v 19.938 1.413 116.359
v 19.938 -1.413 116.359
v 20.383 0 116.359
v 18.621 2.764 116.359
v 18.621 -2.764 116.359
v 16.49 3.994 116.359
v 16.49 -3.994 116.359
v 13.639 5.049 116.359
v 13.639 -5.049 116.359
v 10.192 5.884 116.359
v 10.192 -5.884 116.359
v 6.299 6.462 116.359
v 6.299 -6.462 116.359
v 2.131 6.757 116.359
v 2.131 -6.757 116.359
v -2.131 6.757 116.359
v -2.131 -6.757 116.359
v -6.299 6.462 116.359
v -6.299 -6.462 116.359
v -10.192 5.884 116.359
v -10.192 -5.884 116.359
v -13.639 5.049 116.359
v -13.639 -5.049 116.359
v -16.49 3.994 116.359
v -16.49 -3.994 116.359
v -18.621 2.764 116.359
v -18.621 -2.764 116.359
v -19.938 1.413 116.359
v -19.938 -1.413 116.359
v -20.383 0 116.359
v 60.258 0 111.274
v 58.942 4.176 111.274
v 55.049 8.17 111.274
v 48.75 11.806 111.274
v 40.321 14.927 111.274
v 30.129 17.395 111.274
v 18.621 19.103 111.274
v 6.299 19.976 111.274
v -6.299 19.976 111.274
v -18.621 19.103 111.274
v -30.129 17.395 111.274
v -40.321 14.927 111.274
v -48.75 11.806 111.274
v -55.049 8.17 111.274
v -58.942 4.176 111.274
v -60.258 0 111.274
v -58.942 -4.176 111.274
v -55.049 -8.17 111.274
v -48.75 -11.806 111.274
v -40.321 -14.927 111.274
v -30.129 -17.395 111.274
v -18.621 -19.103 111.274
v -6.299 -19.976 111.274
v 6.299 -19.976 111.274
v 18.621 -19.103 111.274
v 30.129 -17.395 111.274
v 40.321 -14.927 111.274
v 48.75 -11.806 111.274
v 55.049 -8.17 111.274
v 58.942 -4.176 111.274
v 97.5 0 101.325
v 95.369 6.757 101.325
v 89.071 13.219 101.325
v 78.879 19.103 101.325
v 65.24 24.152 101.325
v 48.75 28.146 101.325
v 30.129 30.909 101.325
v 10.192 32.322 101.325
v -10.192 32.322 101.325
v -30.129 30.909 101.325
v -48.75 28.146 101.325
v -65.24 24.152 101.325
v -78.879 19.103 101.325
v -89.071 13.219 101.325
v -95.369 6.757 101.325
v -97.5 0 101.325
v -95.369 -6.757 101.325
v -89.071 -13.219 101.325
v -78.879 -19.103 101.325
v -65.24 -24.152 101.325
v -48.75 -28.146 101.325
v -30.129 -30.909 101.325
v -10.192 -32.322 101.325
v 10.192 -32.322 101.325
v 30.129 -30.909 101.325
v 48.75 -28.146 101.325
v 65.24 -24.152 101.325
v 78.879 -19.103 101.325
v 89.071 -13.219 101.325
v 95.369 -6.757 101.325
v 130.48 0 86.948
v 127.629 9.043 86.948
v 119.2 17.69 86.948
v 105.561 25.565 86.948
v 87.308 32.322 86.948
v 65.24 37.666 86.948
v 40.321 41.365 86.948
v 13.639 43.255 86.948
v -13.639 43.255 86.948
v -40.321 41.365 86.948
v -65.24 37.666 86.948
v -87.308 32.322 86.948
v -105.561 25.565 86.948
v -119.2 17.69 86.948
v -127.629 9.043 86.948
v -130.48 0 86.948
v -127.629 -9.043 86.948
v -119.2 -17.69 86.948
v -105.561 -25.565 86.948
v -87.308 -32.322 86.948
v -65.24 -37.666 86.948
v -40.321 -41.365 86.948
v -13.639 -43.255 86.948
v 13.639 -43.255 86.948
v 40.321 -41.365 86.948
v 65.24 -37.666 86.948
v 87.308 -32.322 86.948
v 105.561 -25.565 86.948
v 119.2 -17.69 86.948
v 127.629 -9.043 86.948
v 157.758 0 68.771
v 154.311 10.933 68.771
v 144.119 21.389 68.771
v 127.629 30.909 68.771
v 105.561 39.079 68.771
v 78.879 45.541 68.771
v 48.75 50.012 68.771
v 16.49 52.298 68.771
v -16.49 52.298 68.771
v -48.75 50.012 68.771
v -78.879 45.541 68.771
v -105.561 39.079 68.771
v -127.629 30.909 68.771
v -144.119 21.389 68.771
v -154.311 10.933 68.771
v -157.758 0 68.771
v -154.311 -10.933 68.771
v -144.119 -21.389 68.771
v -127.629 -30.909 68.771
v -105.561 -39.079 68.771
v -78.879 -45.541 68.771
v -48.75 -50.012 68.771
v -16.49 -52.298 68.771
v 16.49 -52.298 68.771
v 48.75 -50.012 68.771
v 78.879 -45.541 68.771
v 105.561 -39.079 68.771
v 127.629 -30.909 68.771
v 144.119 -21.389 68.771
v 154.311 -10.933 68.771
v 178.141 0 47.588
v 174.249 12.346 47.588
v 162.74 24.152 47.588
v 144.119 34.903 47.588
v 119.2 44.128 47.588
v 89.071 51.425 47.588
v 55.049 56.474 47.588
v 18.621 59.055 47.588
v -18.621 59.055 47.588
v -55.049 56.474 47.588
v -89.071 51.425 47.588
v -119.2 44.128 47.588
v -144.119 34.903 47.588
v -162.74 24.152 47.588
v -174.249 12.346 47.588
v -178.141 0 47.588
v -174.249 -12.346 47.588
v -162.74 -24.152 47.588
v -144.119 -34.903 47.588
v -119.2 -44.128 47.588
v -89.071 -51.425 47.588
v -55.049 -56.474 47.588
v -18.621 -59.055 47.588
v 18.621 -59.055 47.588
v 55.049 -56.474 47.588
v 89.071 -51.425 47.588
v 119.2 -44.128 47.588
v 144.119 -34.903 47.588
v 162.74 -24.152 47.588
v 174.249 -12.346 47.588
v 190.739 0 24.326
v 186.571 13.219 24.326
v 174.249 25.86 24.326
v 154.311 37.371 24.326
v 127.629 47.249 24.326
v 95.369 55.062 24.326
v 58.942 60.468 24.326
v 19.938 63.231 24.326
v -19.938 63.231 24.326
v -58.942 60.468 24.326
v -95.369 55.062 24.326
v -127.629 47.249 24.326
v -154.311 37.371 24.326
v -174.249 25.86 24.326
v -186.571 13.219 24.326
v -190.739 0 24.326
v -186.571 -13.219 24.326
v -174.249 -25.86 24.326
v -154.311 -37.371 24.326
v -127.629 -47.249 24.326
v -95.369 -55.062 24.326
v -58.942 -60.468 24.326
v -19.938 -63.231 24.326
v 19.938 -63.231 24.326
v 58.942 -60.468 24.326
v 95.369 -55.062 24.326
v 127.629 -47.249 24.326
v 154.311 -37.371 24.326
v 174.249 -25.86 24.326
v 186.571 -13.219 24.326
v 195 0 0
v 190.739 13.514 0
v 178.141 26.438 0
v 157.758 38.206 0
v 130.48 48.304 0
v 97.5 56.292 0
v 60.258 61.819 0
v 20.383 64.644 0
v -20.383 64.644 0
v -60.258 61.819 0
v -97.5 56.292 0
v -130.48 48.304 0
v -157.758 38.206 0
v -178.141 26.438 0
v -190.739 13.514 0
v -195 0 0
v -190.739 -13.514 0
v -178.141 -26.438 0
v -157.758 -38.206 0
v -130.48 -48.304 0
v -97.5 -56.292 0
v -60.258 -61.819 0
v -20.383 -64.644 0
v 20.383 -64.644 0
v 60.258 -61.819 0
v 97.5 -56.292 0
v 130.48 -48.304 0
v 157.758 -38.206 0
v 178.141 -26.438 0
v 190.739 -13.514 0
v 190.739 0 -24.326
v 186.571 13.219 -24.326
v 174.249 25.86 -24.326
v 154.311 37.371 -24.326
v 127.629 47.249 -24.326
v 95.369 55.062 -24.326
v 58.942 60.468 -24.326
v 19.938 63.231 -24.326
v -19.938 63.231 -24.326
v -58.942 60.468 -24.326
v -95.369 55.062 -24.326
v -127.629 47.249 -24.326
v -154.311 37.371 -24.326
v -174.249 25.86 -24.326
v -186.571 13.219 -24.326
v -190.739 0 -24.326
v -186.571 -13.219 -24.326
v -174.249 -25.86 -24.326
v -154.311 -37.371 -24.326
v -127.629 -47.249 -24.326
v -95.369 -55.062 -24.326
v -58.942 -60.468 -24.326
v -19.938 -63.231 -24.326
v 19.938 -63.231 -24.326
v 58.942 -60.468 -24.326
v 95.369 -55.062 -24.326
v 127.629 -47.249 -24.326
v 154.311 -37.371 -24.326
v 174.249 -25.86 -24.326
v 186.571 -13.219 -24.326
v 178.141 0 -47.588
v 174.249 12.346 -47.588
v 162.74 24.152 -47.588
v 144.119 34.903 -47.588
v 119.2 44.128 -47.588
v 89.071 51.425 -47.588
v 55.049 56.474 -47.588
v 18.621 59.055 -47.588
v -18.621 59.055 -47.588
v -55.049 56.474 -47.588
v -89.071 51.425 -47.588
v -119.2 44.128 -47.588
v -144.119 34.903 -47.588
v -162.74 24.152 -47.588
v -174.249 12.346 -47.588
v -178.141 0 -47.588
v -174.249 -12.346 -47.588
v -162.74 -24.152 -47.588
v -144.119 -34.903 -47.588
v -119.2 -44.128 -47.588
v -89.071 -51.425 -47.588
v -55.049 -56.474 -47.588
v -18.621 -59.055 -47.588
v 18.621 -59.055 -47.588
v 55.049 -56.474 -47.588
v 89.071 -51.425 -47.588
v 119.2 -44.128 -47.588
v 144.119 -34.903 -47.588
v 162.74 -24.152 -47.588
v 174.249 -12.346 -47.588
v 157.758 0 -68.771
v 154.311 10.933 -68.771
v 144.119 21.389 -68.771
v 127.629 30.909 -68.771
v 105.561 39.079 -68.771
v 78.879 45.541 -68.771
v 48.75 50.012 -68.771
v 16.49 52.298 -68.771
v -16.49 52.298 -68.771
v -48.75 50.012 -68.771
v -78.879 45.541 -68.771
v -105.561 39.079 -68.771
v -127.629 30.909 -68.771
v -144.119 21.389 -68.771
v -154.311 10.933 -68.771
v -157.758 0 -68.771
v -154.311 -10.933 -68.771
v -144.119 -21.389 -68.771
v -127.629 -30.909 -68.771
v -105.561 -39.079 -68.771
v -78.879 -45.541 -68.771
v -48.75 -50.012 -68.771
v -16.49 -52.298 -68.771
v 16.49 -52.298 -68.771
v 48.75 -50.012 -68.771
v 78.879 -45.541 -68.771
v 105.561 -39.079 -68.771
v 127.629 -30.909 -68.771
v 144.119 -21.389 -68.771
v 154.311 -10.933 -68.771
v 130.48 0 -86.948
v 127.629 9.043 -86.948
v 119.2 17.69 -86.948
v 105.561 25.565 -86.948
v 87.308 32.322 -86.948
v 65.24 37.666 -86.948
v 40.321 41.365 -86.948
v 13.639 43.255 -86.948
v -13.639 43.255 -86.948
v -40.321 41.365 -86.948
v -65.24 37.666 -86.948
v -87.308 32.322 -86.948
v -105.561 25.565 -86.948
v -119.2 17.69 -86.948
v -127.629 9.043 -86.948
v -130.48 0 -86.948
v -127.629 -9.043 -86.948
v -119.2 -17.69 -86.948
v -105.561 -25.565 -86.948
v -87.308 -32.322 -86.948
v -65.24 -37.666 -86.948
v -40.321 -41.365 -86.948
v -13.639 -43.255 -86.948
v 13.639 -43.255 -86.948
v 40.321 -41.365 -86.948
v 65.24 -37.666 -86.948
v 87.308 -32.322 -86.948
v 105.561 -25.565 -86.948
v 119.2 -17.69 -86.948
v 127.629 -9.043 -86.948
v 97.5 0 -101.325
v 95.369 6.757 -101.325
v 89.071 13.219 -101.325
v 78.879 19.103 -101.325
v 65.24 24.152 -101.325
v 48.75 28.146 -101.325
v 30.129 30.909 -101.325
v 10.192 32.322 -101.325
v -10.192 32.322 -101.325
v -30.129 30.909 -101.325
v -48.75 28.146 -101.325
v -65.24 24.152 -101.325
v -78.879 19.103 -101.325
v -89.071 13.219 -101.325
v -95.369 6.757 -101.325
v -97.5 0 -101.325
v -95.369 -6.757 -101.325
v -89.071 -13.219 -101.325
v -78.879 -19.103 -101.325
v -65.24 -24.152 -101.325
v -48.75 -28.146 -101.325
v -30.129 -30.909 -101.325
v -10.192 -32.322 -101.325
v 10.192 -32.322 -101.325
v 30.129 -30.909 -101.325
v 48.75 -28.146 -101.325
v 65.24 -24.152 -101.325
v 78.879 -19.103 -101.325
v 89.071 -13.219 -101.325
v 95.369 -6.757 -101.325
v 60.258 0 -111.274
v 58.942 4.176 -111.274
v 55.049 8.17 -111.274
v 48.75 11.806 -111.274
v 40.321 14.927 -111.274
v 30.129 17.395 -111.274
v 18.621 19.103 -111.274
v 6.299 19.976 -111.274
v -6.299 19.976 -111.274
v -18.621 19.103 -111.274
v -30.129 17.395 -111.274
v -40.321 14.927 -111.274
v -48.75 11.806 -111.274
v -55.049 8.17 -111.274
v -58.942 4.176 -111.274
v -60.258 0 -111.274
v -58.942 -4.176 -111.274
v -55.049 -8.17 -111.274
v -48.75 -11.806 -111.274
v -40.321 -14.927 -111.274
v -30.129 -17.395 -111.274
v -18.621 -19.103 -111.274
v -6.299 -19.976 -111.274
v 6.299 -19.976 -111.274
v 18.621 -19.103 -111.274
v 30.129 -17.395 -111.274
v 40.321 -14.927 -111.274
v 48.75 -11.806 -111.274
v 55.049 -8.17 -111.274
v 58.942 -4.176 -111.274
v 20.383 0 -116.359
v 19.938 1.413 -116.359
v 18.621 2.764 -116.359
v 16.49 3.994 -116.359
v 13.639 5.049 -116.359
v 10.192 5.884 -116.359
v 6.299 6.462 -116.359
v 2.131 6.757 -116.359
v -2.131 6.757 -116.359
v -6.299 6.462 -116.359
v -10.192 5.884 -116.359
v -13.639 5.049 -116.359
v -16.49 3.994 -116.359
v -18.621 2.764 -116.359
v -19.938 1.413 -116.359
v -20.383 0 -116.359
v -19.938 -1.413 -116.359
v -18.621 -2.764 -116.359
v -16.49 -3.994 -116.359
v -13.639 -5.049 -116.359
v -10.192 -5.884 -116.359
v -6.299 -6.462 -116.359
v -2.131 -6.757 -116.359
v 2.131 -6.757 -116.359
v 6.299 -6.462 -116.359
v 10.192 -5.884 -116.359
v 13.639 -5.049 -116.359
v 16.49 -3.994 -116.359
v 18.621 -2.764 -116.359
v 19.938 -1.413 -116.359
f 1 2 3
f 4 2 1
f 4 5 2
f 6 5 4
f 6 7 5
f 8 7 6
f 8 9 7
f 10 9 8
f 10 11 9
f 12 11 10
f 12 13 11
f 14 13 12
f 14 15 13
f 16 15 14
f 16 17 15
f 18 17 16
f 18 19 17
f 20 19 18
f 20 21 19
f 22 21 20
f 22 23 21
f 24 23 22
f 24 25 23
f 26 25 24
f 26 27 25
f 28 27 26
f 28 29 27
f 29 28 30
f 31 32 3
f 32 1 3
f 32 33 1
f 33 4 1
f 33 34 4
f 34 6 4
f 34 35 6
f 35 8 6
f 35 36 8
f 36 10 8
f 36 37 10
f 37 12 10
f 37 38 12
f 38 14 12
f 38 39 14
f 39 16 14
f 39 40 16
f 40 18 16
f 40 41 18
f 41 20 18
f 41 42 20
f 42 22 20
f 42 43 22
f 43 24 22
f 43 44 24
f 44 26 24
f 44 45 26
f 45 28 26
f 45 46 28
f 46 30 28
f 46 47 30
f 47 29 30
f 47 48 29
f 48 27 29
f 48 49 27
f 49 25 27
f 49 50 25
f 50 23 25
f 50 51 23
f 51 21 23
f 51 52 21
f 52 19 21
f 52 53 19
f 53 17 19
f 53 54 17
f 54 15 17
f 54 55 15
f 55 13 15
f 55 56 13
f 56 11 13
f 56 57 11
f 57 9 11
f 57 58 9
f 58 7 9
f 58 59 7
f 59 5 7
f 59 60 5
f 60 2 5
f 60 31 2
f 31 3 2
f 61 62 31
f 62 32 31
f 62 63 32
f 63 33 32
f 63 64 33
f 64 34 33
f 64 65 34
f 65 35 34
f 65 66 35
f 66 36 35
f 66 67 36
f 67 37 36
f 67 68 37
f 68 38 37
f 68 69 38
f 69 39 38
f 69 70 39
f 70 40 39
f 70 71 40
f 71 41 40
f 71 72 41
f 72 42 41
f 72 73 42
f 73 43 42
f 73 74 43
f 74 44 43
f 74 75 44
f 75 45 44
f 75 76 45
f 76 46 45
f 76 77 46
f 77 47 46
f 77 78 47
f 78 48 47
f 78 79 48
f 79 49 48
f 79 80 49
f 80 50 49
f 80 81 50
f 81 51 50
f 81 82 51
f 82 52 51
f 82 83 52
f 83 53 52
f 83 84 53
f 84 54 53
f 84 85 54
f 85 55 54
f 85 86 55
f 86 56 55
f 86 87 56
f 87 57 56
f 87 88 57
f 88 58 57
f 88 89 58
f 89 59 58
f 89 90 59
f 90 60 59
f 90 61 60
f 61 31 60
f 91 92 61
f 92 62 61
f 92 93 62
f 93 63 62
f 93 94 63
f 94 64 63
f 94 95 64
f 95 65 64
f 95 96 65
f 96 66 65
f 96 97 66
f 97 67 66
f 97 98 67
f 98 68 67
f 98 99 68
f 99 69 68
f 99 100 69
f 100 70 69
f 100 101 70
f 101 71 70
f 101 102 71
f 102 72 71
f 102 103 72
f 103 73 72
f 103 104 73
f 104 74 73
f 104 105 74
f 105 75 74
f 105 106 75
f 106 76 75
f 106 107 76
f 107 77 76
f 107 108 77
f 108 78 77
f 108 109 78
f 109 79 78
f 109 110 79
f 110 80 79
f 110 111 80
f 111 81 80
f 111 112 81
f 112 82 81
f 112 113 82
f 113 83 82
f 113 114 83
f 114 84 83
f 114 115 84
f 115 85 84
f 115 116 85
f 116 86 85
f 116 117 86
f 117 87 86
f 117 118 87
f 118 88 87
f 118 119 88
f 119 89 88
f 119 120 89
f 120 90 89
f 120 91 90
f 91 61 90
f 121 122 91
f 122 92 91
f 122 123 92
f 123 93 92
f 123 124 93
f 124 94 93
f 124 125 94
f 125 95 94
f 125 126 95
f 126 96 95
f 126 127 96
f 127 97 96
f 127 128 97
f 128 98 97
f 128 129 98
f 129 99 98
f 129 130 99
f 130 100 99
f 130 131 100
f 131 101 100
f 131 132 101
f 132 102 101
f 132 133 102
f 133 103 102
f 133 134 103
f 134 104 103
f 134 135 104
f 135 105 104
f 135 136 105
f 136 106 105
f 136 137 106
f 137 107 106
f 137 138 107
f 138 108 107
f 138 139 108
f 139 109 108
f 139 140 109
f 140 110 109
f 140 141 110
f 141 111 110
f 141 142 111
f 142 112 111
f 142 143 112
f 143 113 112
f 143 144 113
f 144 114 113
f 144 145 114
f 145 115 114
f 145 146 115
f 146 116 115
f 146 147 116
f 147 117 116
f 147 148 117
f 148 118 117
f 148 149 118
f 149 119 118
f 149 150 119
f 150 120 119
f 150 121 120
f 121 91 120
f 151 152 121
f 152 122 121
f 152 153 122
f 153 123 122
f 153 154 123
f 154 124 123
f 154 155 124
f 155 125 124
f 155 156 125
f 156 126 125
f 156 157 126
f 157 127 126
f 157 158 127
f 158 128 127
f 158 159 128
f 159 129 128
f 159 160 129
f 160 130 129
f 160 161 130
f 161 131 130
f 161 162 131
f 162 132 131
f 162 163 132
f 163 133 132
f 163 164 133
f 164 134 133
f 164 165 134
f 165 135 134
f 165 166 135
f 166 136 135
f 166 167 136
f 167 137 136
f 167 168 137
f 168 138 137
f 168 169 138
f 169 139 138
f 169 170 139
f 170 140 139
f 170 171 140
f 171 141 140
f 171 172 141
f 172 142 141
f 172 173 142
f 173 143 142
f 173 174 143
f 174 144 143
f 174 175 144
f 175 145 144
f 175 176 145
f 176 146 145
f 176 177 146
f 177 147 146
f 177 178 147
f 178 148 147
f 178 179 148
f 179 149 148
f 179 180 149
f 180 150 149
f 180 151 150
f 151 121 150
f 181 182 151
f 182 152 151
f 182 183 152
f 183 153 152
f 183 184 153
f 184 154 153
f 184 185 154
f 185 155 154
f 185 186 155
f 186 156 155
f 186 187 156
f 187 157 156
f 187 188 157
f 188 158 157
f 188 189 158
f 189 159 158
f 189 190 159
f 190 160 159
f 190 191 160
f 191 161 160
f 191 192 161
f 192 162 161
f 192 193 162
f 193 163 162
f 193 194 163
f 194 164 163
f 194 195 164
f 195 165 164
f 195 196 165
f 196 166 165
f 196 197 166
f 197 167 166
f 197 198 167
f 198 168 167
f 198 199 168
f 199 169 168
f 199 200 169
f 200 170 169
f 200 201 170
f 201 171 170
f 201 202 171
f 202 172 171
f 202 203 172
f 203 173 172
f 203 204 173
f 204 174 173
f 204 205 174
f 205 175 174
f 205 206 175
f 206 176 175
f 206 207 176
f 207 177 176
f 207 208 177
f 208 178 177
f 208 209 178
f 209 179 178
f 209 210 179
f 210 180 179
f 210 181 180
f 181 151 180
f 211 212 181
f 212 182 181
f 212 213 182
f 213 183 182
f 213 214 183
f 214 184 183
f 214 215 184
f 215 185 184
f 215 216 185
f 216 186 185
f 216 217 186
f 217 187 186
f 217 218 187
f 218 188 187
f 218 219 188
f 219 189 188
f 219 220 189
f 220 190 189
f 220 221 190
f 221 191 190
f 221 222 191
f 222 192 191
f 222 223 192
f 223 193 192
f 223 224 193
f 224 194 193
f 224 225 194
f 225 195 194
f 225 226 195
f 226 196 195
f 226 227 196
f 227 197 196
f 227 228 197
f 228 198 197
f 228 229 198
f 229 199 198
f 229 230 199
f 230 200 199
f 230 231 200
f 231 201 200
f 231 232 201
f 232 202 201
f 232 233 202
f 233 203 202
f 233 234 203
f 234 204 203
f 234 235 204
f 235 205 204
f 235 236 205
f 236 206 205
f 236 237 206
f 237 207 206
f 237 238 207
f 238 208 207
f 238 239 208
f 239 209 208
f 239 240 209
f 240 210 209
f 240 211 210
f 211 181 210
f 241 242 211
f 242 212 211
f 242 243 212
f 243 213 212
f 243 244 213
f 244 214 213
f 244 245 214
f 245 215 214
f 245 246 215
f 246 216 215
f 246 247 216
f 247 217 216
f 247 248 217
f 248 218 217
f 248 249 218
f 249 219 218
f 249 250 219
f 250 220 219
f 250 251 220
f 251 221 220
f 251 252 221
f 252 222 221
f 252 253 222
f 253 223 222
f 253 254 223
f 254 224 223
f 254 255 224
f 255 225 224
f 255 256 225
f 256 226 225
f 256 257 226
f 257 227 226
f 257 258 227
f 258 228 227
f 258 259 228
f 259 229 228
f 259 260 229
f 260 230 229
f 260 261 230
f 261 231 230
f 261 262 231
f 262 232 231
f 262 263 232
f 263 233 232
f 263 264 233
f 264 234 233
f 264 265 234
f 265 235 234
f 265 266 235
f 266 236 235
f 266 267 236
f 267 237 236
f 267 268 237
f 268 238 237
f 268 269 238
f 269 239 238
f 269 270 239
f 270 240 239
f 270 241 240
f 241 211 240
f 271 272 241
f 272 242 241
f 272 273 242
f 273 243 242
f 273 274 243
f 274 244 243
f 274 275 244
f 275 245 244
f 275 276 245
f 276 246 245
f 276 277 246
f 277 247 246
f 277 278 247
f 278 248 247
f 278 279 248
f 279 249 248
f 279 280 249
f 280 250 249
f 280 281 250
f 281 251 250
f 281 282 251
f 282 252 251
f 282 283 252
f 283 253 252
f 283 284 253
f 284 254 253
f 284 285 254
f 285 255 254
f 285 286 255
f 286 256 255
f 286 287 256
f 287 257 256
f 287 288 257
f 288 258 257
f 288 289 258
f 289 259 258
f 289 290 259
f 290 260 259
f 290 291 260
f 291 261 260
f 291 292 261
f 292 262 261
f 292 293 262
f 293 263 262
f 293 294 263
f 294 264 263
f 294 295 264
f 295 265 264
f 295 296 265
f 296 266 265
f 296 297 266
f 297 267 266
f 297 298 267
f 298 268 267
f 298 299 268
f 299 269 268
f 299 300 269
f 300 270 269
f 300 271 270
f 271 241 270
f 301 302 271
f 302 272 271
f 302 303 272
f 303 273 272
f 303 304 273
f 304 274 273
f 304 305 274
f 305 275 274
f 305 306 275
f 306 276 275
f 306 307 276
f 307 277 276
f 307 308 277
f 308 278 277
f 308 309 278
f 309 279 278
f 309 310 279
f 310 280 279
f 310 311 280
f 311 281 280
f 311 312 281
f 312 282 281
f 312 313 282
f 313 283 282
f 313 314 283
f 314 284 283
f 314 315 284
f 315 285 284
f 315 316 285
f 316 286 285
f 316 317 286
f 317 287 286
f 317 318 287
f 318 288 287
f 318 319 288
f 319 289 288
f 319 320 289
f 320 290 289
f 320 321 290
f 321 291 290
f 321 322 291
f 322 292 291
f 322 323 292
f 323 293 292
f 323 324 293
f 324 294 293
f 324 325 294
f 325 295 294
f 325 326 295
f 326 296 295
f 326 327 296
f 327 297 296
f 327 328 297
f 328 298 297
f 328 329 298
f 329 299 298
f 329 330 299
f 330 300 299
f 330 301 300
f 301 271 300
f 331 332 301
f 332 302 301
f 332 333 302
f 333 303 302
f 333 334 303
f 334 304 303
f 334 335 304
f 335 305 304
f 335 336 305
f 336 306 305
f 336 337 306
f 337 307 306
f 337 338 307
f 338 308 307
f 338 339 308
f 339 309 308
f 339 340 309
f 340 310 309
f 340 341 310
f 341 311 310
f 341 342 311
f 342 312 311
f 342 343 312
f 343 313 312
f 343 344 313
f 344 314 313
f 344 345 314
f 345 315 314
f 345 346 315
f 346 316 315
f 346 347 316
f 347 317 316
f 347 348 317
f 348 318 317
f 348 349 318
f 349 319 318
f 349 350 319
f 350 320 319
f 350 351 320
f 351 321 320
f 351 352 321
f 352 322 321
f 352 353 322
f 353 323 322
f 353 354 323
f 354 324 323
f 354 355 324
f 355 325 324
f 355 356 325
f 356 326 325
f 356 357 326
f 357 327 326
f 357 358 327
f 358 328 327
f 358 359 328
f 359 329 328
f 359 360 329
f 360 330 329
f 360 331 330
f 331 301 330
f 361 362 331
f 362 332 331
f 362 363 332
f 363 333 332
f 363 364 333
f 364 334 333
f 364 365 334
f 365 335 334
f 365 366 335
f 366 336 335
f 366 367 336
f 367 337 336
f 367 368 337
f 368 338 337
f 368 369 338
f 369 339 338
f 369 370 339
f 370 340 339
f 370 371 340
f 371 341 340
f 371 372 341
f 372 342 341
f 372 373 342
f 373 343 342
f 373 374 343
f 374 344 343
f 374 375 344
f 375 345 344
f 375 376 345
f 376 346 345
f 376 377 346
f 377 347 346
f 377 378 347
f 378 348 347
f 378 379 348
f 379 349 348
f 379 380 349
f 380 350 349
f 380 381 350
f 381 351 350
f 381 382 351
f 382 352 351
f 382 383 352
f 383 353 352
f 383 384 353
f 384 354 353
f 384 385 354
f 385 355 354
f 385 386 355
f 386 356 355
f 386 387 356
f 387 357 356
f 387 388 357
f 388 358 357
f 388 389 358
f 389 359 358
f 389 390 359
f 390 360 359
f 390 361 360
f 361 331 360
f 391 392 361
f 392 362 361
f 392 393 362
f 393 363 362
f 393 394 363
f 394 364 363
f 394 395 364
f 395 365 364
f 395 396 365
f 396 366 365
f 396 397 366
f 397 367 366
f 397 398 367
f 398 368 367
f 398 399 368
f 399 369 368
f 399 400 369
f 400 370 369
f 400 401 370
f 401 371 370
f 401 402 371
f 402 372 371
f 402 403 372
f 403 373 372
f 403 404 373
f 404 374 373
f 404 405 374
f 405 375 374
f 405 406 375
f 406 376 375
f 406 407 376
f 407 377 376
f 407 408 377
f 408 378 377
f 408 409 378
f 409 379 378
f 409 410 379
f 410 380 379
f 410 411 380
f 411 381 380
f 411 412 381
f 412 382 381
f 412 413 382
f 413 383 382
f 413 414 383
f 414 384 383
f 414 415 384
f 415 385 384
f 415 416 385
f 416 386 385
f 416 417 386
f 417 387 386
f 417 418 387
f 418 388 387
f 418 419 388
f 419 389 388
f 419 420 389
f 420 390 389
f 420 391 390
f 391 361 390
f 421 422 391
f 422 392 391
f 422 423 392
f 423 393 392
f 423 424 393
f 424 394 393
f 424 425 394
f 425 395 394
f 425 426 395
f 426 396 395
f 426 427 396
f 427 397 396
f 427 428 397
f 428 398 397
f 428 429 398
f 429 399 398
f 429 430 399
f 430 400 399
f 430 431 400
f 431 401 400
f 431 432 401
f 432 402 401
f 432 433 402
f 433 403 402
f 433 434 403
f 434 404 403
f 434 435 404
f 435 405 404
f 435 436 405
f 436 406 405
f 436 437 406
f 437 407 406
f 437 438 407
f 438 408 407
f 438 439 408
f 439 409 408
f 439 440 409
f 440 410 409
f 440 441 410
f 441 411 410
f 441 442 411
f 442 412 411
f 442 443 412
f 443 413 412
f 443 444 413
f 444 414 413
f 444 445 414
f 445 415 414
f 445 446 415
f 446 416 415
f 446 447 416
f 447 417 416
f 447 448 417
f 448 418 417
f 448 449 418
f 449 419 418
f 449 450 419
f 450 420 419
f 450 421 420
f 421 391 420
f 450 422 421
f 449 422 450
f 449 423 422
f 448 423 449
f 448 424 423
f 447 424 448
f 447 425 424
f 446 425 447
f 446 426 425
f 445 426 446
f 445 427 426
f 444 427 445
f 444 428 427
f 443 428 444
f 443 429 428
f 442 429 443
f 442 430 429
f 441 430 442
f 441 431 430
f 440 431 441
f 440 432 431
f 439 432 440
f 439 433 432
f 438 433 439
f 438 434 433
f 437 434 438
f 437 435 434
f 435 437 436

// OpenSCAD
// Generated by SolidPython 1.0.1 on 2020-07-29 00:46:51


scale(v = [15, 5, 9]) {
	sphere(r = 13);
}
/***********************************************
*********      SolidPython code:      **********
************************************************
 
# import packages: SolidPython
from solid import *
from solid.utils import *
from itertools import chain, combinations, permutations


class Resize:

    def __init__(self, scad_file):
        self.scad_file = scad_file
        #self.scad_file = import_scad(scad_file)
        # cone/cylinder param:
        self.r1 = 0
        self.r2 = 0
        self.h = 0
        # rectangular prism param:
        self.w = 0
        self.l = 0
        # ellipse param:
        self.r = 0

    # import OpenScad code (file name corresponds to shape)


    # classify shape + parameters
    def assign(self, param1, param2, param3):
        if self.scad_file == 'cone.scad':
            self.r1 = param1
            self.r2 = param2
            self.h = param3
        elif self.scad_file == 'cylinder.scad':
            self.r1 = param1
            self.r2 = param2
            self.h = param3
        elif self.scad_file == 'rectangularPrism.scad':
            self.h = param1
            self.l = param2
            self.w = param3
        else:
            self.r = param1
            self.h = param2

    # resize parameters
    def iterate(self):
        x = range(3, 20, 2)
        i = 1
        if self.scad_file == 'cone.scad':
            tempList = list(permutations(x, 2))
            for temp in tempList:
                param1 = temp[0]
                param2 = temp[1]
                filepath = 'produced_scad_files/' + 'cone' + str(param1) + '_' + str(param2) + '_' + '.scad'
                scad_render_to_file(cylinder(h=param1, r1=param2, r2=0), filepath)

        elif self.scad_file == 'cylinder.scad':
            tempList = list(permutations(x, 3))
            for temp in tempList:
                param1 = temp[0]
                param2 = temp[1]
                filepath = 'produced_scad_files/' + 'cylinder' + str(param1) + '_' + str(param2) + '_' + '.scad'
                scad_render_to_file(cylinder(h=param1, r1=param2, r2=param2), filepath)

        elif self.scad_file == 'rectangularPrism.scad':
            tempList = list(permutations(x, 3))
            for temp in tempList:
                param1 = temp[0]
                param2 = temp[1]
                param3 = temp[2]
                filepath = 'produced_scad_files/' + 'rectangularPrism' + str(param1) + '_' + str(param2) + '_' + str(
                    param3) + '.scad'
                scad_render_to_file(cube(size=(param1, param2, param3)), filepath)

        elif self.scad_file == 'ellipse.scad':
            tempList = list(permutations(x, 4))
            for temp in tempList:
                param1 = temp[0]
                param2 = temp[1]
                param3 = temp[2]
                param4 = temp[3]
                filepath = 'produced_scad_files/' + 'ellipse' + str(param1) + '_' + str(param2) + '_' + str(param3) + '_' + str(param4) + '.scad'
                scad_render_to_file(scale([param1, param2, param3])(sphere(r=param4)), filepath)

    def render_to_scadfile(self):
        scad_render_to_file(scad, 'example.scad') 
 
************************************************/
